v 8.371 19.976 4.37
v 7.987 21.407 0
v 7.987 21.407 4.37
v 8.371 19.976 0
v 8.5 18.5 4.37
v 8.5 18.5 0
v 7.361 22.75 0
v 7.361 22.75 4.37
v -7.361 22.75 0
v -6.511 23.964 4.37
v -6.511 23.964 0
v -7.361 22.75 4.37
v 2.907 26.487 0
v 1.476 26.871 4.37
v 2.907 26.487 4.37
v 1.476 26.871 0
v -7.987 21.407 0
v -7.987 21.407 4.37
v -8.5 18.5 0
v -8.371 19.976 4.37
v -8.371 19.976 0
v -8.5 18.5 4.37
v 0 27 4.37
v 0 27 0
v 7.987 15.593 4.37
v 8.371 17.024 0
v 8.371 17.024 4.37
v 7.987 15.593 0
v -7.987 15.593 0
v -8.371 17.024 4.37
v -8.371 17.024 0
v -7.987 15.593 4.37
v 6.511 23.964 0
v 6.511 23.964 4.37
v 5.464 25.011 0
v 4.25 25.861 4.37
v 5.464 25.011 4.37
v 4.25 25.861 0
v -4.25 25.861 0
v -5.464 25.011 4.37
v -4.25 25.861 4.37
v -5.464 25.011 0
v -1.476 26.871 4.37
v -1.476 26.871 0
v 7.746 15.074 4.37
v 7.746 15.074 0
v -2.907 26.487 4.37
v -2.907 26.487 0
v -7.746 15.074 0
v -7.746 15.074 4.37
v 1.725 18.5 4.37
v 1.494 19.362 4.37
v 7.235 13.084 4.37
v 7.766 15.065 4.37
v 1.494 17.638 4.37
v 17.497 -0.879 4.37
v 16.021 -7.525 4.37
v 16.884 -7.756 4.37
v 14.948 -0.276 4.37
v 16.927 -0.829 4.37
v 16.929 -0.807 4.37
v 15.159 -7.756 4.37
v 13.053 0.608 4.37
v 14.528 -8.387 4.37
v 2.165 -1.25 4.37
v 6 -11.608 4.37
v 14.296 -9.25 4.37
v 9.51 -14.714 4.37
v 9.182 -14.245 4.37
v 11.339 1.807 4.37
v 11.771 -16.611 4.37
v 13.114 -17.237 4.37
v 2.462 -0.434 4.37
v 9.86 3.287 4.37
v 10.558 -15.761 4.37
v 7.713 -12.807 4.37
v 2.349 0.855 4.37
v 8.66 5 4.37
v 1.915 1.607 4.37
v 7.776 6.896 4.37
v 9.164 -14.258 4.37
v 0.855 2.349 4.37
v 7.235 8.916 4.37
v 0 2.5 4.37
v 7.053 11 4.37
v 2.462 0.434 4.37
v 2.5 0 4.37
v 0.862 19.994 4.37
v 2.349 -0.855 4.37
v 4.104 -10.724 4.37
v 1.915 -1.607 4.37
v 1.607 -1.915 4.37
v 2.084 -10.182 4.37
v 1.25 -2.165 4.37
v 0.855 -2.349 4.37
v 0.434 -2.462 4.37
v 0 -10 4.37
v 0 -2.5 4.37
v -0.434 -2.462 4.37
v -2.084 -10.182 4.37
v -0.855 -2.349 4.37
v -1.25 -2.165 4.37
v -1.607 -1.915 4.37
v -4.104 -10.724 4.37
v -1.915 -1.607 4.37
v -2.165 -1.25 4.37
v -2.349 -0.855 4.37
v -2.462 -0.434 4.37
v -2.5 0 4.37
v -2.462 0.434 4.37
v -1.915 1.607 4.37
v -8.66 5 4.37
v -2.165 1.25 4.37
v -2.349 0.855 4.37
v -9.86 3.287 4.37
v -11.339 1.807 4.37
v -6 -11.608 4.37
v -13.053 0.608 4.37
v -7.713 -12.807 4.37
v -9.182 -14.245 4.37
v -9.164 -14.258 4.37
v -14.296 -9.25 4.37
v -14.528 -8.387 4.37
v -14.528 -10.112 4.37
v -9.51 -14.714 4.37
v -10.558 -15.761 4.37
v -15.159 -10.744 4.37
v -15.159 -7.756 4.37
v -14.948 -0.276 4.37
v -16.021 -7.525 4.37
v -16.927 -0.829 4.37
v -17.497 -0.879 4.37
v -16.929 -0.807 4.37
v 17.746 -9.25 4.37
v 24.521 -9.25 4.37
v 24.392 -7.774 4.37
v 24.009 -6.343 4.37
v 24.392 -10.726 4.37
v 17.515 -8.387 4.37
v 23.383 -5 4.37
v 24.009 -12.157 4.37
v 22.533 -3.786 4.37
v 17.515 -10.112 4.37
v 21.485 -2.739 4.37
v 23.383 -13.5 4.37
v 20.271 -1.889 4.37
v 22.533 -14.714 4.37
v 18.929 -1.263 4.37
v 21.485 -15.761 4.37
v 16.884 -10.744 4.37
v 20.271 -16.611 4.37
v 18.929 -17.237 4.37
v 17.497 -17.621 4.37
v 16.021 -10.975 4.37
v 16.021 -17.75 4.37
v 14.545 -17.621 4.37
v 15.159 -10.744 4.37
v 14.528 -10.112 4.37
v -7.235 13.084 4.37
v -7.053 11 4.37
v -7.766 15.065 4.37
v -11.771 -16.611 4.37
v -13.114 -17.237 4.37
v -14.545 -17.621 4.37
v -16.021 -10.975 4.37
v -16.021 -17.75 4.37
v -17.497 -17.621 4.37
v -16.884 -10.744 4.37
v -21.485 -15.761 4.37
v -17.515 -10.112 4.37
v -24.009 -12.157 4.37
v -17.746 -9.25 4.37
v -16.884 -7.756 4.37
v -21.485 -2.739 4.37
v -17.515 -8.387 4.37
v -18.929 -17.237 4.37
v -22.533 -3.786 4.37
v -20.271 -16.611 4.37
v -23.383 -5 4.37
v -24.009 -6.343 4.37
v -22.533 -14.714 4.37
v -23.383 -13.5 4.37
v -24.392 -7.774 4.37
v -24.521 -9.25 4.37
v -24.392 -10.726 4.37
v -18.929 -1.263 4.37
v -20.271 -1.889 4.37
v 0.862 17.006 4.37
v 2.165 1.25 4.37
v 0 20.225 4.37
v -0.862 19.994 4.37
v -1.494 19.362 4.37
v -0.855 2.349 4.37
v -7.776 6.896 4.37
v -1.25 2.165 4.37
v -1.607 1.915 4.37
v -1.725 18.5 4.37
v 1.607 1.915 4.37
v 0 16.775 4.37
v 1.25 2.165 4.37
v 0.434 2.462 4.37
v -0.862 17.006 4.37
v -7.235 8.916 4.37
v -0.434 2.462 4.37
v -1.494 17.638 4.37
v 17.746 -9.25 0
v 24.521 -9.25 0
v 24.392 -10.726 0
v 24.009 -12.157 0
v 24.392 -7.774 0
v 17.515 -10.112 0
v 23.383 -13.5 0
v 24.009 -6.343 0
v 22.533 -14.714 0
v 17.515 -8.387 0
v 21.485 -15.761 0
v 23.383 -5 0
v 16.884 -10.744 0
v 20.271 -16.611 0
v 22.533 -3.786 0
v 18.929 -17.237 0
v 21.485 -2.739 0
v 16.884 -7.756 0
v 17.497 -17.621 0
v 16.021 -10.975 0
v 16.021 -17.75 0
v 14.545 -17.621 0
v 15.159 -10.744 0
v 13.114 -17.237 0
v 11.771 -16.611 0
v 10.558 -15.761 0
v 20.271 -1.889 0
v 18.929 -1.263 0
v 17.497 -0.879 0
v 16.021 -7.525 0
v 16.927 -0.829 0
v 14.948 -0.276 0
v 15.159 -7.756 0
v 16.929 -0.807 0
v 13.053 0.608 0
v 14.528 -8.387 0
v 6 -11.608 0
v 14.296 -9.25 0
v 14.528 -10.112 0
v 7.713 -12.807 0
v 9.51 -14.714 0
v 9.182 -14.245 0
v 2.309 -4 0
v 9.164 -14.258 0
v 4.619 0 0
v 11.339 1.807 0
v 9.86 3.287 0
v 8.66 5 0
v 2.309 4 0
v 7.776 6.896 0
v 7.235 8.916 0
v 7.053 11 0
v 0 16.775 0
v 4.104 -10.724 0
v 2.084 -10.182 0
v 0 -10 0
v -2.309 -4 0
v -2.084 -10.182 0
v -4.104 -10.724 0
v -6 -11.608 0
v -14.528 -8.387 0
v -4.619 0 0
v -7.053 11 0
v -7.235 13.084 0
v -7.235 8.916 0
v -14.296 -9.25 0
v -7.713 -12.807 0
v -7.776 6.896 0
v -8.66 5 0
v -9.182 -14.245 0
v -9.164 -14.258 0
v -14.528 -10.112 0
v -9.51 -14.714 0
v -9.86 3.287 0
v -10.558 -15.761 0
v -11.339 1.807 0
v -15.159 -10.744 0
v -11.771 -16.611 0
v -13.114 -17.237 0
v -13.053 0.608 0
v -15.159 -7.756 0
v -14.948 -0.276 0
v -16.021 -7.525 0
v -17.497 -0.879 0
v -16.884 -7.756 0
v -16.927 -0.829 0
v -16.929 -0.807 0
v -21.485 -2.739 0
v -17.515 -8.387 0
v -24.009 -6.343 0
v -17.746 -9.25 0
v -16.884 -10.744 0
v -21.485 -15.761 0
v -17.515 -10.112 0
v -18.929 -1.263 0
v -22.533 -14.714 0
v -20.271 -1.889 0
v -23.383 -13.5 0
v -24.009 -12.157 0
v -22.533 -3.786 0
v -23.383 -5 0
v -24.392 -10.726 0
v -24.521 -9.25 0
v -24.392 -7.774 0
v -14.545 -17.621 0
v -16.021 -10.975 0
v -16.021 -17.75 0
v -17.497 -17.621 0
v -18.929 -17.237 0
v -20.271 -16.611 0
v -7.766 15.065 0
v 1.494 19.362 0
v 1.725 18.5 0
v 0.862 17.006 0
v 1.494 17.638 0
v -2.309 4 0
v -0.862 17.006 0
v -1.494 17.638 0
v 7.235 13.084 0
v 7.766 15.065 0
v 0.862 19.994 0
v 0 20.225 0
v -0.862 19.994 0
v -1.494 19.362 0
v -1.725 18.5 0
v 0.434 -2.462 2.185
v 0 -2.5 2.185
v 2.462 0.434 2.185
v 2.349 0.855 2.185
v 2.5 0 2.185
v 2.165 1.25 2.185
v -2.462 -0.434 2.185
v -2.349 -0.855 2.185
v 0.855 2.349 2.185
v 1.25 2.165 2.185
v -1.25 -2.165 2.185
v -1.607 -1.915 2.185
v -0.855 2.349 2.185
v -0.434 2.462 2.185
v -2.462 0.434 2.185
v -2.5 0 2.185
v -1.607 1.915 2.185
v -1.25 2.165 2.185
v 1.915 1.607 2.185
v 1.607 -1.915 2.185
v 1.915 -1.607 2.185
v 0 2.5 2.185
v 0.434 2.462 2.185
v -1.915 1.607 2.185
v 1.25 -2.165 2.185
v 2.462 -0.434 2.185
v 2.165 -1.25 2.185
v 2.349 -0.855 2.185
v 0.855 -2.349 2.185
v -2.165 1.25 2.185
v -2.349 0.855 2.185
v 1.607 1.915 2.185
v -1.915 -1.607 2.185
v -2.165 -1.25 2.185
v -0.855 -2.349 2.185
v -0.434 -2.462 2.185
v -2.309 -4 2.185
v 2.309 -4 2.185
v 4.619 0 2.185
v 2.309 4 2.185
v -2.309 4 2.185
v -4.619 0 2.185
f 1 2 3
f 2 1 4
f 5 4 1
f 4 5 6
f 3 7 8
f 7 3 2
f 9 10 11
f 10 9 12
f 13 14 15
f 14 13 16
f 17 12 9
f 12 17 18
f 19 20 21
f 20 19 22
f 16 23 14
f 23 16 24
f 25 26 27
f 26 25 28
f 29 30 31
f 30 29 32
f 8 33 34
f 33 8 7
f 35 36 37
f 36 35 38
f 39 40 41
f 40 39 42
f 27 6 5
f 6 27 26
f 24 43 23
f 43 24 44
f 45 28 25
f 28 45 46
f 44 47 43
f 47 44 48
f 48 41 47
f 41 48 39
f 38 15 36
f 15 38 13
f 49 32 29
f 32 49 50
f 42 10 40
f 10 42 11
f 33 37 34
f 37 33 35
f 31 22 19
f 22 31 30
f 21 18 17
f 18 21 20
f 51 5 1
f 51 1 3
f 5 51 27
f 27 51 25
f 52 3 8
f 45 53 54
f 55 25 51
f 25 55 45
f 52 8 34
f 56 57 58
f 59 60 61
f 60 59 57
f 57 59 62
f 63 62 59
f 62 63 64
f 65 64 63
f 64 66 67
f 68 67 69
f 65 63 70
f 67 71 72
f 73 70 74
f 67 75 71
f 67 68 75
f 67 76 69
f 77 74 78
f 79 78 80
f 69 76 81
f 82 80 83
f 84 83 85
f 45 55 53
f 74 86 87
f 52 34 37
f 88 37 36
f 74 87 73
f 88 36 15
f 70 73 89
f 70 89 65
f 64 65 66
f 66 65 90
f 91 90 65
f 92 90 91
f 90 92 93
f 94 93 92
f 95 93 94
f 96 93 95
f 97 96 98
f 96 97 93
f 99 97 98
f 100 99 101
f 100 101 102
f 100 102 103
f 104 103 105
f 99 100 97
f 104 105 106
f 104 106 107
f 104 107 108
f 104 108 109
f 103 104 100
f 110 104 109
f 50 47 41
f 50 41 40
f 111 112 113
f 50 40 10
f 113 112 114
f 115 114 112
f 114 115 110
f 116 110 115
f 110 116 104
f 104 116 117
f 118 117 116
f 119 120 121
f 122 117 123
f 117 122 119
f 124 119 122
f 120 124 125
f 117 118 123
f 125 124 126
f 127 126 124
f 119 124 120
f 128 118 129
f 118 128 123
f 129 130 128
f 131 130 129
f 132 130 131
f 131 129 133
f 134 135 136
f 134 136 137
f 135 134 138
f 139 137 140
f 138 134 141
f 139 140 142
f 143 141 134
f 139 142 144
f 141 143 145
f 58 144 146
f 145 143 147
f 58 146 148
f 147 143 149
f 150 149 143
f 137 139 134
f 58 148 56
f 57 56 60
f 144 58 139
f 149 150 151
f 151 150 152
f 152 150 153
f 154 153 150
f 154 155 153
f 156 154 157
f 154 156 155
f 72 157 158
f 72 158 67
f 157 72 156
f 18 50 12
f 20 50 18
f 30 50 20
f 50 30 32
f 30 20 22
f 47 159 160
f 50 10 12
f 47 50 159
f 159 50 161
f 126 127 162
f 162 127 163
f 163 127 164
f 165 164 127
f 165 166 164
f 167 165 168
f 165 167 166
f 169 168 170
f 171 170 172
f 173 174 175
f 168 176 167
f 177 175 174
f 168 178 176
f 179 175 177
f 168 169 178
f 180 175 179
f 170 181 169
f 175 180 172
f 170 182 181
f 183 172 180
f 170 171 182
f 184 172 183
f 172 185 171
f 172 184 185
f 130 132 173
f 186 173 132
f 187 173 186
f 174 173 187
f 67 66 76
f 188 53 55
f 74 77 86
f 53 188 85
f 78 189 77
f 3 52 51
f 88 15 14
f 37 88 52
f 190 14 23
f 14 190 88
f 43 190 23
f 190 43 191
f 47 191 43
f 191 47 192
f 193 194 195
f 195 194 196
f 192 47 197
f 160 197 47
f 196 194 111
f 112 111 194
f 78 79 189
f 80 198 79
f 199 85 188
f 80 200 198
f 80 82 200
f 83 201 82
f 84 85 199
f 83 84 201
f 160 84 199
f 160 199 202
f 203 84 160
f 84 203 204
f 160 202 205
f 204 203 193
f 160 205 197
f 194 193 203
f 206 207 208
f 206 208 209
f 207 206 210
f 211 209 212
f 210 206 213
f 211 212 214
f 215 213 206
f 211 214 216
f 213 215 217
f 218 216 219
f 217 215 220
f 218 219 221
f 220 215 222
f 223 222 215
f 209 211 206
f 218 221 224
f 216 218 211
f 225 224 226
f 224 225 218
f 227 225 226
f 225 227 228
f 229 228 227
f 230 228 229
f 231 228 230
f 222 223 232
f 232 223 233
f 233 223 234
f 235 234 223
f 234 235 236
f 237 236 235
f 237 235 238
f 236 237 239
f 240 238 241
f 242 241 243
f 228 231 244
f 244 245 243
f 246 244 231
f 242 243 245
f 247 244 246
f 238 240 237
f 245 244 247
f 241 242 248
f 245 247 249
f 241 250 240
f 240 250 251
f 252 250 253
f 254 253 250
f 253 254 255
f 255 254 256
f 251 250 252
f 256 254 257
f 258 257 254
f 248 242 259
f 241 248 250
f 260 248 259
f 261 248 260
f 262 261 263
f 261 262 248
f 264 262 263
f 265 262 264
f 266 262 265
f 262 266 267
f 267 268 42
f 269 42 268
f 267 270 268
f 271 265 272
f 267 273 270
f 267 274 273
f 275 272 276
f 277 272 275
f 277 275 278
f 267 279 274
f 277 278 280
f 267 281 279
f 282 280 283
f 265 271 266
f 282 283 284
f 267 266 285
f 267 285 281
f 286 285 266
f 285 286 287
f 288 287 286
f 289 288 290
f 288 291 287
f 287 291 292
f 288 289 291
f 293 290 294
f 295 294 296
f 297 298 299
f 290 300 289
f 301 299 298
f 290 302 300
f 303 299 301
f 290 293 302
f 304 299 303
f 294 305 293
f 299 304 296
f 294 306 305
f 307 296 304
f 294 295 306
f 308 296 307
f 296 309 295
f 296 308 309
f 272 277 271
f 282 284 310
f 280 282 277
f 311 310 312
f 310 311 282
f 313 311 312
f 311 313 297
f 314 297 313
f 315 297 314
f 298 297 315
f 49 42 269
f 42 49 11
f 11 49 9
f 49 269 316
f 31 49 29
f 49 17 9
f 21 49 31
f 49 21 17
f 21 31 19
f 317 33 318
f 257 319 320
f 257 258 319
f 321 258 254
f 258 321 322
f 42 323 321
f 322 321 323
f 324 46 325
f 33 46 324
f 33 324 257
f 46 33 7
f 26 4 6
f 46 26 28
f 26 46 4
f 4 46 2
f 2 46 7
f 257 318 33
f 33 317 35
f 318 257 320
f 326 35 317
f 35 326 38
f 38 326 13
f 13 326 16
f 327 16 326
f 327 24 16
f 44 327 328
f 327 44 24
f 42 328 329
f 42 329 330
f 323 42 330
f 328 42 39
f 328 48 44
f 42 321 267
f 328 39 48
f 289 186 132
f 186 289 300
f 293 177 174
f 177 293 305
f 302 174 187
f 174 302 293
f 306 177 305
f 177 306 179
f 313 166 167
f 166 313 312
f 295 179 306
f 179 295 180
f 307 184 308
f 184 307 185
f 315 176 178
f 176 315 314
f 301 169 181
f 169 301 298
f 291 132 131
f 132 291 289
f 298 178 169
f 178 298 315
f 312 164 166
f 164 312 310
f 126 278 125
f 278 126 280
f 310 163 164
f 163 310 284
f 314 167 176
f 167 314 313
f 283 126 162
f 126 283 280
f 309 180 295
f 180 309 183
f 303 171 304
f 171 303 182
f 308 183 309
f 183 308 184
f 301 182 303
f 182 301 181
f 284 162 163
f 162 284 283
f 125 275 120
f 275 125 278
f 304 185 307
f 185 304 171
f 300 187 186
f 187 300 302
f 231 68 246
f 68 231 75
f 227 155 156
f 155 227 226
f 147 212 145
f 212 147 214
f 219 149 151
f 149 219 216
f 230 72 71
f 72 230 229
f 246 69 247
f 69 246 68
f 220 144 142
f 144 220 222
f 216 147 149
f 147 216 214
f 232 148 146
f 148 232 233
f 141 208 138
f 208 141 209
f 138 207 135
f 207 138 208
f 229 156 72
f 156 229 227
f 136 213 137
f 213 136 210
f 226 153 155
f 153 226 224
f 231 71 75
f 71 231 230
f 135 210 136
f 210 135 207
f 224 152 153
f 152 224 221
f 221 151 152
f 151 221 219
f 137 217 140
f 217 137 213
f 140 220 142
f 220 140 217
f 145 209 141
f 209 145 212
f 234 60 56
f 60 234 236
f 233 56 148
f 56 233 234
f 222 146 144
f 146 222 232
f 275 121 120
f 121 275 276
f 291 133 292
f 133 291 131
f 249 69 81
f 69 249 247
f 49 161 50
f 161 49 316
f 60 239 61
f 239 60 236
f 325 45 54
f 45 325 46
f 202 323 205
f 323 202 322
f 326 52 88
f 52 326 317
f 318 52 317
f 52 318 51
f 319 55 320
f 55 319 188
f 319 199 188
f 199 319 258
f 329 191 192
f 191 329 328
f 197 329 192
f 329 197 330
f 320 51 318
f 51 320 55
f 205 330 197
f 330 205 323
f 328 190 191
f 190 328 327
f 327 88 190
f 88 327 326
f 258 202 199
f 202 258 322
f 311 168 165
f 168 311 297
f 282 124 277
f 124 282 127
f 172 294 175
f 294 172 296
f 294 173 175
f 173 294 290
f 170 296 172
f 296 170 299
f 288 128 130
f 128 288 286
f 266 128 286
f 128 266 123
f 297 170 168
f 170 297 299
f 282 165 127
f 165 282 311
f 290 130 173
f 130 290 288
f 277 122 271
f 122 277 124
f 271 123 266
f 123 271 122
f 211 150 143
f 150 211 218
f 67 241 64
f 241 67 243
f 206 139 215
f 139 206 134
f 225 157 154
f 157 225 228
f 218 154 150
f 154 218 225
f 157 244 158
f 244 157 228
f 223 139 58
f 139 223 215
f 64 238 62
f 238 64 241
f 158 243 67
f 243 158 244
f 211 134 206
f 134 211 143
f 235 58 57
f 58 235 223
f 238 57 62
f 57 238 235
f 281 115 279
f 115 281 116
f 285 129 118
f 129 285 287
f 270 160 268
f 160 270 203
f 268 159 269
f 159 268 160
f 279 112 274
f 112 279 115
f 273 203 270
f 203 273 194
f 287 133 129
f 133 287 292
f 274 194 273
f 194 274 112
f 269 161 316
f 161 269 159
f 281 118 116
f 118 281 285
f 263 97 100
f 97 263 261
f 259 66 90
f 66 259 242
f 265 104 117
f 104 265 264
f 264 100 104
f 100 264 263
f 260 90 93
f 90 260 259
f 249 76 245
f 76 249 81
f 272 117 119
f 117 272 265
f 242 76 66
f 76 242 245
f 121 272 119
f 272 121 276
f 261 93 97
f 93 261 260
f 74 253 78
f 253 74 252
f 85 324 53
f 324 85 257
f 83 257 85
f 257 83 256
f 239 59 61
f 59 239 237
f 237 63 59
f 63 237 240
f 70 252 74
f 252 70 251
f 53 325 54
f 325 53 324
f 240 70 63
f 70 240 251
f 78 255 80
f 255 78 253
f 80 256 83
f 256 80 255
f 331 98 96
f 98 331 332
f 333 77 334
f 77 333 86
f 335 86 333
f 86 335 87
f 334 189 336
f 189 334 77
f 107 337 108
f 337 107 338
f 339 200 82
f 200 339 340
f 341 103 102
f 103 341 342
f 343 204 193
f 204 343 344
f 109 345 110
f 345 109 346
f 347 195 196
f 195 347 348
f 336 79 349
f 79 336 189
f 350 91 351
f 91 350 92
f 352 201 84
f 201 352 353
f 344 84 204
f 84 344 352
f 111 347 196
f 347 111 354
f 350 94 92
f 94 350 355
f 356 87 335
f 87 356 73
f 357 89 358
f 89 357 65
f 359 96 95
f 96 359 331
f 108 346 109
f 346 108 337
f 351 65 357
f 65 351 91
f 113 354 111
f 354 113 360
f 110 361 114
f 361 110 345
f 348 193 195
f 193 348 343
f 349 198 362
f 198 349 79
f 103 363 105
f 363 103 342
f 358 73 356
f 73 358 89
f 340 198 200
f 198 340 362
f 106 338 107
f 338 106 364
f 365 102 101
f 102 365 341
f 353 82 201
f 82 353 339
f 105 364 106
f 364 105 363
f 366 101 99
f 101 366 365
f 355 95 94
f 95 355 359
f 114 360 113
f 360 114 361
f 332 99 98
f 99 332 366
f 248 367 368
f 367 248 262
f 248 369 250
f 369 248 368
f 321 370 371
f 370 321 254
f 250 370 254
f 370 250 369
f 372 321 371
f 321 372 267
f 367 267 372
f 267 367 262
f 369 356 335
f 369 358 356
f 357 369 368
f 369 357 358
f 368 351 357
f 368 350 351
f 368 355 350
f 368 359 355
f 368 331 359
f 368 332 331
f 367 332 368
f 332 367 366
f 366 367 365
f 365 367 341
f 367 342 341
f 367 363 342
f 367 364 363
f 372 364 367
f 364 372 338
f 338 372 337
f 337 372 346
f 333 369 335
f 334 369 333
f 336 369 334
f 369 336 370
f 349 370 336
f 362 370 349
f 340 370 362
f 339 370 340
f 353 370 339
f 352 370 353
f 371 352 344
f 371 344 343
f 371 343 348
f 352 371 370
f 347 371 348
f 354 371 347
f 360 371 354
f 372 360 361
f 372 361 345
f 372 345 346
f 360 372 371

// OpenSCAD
// file: nutsnbolts/data-access.scad
// Norm Nuts and Bolts - a OpenSCAD library
// Copyright (C) 2012  Johannes Kneer

// This program is free software: you can redistribute it and/or modify
// it under the terms of the GNU General Public License as published by
// the Free Software Foundation, either version 3 of the License, or
// (at your option) any later version.

// This program is distributed in the hope that it will be useful,
// but WITHOUT ANY WARRANTY; without even the implied warranty of
// MERCHANTABILITY or FITNESS FOR A PARTICULAR PURPOSE.  See the
// GNU General Public License for more details.

// You should have received a copy of the GNU General Public License
// along with this program.  If not, see <http://www.gnu.org/licenses/>.


// DATABASE ACCESS FUNCTIONS AND CONSTANTS



// == CONSTANTS ==

// screw table access keys
_NB_S_DESC            = 0;
_NB_S_FAMKEY			    = 1;
_NB_S_LENGTH          = 2;
_NB_S_NOTHREAD_LENGTH = 3;

_NB_F_DESC			      = 0;
_NB_F_OUTER_DIA       = 1;
_NB_F_INNER_DIA       = 2;
_NB_F_LEAD            = 3;
_NB_F_KEY             = 4;
_NB_F_KEY_DEPTH       = 5;
_NB_F_HEAD_HEIGHT     = 6;
_NB_F_HEAD_DIA        = 7;
_NB_F_NUT_KEY         = 8;
_NB_F_NUT_HEIGHT      = 9;
_NB_F_PITCH_FINE      = 10;
_NB_F_PITCH_MEDIUM    = 11;
_NB_F_PITCH_COARSE    = 12;


// == FUNCTIONS ==

// _get_screw("descriptor")   with descriptor = M8x25
//   find the line for a general object in the data matrix

function _get_screw(n) = data_screw[search([n], data_screw)[0]];
function _get_screw_fam(n) = data_screw_fam[search([_get_screw(n)[_NB_S_FAMKEY]], data_screw_fam)[0]];

function _get_fam(n) = data_screw_fam[search([n], data_screw_fam)[0]];


// _get_XXXXX("descriptor") functions
// find a single property in the database

function _get_desc(n)        = _get_screw(n)[_NB_S_DESC];
function _get_famkey(n)         = _get_screw(n)[_NB_S_FAMKEY];
function _get_length(n)      = _get_screw(n)[_NB_S_LENGTH];
function _get_nt_length(n)   = _get_screw(n)[_NB_S_NOTHREAD_LENGTH];

function _get_outer_dia(n)   = _get_screw_fam(n)[_NB_F_OUTER_DIA];
function _get_inner_dia(n)   = _get_screw_fam(n)[_NB_F_INNER_DIA];
function _get_lead(n)        = _get_screw_fam(n)[_NB_F_LEAD];
function _get_head_height(n) = _get_screw_fam(n)[_NB_F_HEAD_HEIGHT];
function _get_head_dia(n)    = _get_screw_fam(n)[_NB_F_HEAD_DIA];
function _get_nut_key(n)     = _get_screw_fam(n)[_NB_F_NUT_KEY];
function _get_nut_height(n)  = _get_screw_fam(n)[_NB_F_NUT_HEIGHT];
function _get_fine_pitch(n)  = _get_screw_fam(n)[_NB_F_PITCH_FINE];
function _get_medium_pitch(n)  = _get_screw_fam(n)[_NB_F_PITCH_MEDIUM];
function _get_coarse_pitch(n)  = _get_screw_fam(n)[_NB_F_PITCH_COARSE];
// file: nutsnbolts/materials.scad
// Norm Nuts and Bolts - a OpenSCAD library
// Copyright (C) 2012  Johannes Kneer

// This program is free software: you can redistribute it and/or modify
// it under the terms of the GNU General Public License as published by
// the Free Software Foundation, either version 3 of the License, or
// (at your option) any later version.

// This program is distributed in the hope that it will be useful,
// but WITHOUT ANY WARRANTY; without even the implied warranty of
// MERCHANTABILITY or FITNESS FOR A PARTICULAR PURPOSE.  See the
// GNU General Public License for more details.

// You should have received a copy of the GNU General Public License
// along with this program.  If not, see <http://www.gnu.org/licenses/>.


// MATERIALS

// all materials take a no-parameter that should be used to document
// the exact material in code, the number is not yet used in the code 



module stainless(no="1.4301") {
	color([0.45, 0.43, 0.5]) children([0:$children-1]);
}

module steel(no) {
	color([0.65, 0.67, 0.72]) children([0:$children-1]);
}

module iron(no="ST37") {
	color([0.36, 0.33, 0.33]) children([0:$children-1]);
}

// additional colors
CL_ZINC = [0.4, 0.4, 0.4];
// file: configuration.scad
// Increase this if your slicer or printer make holes too tight.
extra_radius = 0.1;

// OD = outside diameter, corner to corner.
m3_nut_od = 6.1;
m3_nut_radius = m3_nut_od/2 + 0.2 + extra_radius;

// Major diameter of metric 3mm thread.
m3_major = 2.85;
m3_radius = m3_major/2 + extra_radius;
m3_wide_radius = m3_major/2 + extra_radius + 0.2;

// NEMA17 stepper motors.
motor_shaft_diameter = 5;
motor_shaft_radius = motor_shaft_diameter/2 + extra_radius;

// Frame brackets. M3x8mm screws work best with 3.6 mm brackets.
thickness = 3.6;

// OpenBeam or Misumi. Currently only 15x15 mm, but there is a plan
// to make models more parametric and allow 20x20 mm in the future.
extrusion = 15;
// main file
include <configuration.scad>;

include <nutsnbolts/cyl_head_bolt.scad>;
include <nutsnbolts/materials.scad>;

separation = 44;  // Distance between ball joint mounting faces.
offset = 22;  // Same as DELTA_EFFECTOR_OFFSET in Marlin.
mount_radius = 18.5;  // Hotend mounting screws, standard would be 25mm.
jhead_od_radius = 8;  // Hole for the hotend (J-Head diameter is 16mm).
jhead_id_radius = 6;

jhead_height=2;


m5_radius=2.5;
m5nut_thickness=2.7;
m5_bowden_height=4.37;

height = m5_bowden_height;

module mount_cap() {
  difference() {
    union() {
       
		cylinder(r=offset-5, h=height, center=true, $fn=36);
		
		 for (a = [0:120:359]) rotate([0, 0, a]) {
      	  translate([0, mount_radius, 0])	cylinder(r=8.5, h=height, center=true, $fn=36);
    		  }
	}
    
    translate([0, 0, -1])cylinder(r=m5_radius, h=height*3, $fn=36);
    translate([0, 0, 0]) nutcatch_parallel("M5", l=2.7);


    for (a = [0:120:359]) rotate([0, 0, a]) {
      translate([0, mount_radius, height/2])	cylinder(r=m3_wide_radius, h=2*height, center=true, $fn=12);
    }

	
    for (a = [60:120:359]) rotate([0, 0, a]) {
      translate([0, offset, height/2])	cylinder(r=12, h=2*height, center=true, $fn=36);
    }

  }

}

translate([0, 0, height/2]) mount_cap();
